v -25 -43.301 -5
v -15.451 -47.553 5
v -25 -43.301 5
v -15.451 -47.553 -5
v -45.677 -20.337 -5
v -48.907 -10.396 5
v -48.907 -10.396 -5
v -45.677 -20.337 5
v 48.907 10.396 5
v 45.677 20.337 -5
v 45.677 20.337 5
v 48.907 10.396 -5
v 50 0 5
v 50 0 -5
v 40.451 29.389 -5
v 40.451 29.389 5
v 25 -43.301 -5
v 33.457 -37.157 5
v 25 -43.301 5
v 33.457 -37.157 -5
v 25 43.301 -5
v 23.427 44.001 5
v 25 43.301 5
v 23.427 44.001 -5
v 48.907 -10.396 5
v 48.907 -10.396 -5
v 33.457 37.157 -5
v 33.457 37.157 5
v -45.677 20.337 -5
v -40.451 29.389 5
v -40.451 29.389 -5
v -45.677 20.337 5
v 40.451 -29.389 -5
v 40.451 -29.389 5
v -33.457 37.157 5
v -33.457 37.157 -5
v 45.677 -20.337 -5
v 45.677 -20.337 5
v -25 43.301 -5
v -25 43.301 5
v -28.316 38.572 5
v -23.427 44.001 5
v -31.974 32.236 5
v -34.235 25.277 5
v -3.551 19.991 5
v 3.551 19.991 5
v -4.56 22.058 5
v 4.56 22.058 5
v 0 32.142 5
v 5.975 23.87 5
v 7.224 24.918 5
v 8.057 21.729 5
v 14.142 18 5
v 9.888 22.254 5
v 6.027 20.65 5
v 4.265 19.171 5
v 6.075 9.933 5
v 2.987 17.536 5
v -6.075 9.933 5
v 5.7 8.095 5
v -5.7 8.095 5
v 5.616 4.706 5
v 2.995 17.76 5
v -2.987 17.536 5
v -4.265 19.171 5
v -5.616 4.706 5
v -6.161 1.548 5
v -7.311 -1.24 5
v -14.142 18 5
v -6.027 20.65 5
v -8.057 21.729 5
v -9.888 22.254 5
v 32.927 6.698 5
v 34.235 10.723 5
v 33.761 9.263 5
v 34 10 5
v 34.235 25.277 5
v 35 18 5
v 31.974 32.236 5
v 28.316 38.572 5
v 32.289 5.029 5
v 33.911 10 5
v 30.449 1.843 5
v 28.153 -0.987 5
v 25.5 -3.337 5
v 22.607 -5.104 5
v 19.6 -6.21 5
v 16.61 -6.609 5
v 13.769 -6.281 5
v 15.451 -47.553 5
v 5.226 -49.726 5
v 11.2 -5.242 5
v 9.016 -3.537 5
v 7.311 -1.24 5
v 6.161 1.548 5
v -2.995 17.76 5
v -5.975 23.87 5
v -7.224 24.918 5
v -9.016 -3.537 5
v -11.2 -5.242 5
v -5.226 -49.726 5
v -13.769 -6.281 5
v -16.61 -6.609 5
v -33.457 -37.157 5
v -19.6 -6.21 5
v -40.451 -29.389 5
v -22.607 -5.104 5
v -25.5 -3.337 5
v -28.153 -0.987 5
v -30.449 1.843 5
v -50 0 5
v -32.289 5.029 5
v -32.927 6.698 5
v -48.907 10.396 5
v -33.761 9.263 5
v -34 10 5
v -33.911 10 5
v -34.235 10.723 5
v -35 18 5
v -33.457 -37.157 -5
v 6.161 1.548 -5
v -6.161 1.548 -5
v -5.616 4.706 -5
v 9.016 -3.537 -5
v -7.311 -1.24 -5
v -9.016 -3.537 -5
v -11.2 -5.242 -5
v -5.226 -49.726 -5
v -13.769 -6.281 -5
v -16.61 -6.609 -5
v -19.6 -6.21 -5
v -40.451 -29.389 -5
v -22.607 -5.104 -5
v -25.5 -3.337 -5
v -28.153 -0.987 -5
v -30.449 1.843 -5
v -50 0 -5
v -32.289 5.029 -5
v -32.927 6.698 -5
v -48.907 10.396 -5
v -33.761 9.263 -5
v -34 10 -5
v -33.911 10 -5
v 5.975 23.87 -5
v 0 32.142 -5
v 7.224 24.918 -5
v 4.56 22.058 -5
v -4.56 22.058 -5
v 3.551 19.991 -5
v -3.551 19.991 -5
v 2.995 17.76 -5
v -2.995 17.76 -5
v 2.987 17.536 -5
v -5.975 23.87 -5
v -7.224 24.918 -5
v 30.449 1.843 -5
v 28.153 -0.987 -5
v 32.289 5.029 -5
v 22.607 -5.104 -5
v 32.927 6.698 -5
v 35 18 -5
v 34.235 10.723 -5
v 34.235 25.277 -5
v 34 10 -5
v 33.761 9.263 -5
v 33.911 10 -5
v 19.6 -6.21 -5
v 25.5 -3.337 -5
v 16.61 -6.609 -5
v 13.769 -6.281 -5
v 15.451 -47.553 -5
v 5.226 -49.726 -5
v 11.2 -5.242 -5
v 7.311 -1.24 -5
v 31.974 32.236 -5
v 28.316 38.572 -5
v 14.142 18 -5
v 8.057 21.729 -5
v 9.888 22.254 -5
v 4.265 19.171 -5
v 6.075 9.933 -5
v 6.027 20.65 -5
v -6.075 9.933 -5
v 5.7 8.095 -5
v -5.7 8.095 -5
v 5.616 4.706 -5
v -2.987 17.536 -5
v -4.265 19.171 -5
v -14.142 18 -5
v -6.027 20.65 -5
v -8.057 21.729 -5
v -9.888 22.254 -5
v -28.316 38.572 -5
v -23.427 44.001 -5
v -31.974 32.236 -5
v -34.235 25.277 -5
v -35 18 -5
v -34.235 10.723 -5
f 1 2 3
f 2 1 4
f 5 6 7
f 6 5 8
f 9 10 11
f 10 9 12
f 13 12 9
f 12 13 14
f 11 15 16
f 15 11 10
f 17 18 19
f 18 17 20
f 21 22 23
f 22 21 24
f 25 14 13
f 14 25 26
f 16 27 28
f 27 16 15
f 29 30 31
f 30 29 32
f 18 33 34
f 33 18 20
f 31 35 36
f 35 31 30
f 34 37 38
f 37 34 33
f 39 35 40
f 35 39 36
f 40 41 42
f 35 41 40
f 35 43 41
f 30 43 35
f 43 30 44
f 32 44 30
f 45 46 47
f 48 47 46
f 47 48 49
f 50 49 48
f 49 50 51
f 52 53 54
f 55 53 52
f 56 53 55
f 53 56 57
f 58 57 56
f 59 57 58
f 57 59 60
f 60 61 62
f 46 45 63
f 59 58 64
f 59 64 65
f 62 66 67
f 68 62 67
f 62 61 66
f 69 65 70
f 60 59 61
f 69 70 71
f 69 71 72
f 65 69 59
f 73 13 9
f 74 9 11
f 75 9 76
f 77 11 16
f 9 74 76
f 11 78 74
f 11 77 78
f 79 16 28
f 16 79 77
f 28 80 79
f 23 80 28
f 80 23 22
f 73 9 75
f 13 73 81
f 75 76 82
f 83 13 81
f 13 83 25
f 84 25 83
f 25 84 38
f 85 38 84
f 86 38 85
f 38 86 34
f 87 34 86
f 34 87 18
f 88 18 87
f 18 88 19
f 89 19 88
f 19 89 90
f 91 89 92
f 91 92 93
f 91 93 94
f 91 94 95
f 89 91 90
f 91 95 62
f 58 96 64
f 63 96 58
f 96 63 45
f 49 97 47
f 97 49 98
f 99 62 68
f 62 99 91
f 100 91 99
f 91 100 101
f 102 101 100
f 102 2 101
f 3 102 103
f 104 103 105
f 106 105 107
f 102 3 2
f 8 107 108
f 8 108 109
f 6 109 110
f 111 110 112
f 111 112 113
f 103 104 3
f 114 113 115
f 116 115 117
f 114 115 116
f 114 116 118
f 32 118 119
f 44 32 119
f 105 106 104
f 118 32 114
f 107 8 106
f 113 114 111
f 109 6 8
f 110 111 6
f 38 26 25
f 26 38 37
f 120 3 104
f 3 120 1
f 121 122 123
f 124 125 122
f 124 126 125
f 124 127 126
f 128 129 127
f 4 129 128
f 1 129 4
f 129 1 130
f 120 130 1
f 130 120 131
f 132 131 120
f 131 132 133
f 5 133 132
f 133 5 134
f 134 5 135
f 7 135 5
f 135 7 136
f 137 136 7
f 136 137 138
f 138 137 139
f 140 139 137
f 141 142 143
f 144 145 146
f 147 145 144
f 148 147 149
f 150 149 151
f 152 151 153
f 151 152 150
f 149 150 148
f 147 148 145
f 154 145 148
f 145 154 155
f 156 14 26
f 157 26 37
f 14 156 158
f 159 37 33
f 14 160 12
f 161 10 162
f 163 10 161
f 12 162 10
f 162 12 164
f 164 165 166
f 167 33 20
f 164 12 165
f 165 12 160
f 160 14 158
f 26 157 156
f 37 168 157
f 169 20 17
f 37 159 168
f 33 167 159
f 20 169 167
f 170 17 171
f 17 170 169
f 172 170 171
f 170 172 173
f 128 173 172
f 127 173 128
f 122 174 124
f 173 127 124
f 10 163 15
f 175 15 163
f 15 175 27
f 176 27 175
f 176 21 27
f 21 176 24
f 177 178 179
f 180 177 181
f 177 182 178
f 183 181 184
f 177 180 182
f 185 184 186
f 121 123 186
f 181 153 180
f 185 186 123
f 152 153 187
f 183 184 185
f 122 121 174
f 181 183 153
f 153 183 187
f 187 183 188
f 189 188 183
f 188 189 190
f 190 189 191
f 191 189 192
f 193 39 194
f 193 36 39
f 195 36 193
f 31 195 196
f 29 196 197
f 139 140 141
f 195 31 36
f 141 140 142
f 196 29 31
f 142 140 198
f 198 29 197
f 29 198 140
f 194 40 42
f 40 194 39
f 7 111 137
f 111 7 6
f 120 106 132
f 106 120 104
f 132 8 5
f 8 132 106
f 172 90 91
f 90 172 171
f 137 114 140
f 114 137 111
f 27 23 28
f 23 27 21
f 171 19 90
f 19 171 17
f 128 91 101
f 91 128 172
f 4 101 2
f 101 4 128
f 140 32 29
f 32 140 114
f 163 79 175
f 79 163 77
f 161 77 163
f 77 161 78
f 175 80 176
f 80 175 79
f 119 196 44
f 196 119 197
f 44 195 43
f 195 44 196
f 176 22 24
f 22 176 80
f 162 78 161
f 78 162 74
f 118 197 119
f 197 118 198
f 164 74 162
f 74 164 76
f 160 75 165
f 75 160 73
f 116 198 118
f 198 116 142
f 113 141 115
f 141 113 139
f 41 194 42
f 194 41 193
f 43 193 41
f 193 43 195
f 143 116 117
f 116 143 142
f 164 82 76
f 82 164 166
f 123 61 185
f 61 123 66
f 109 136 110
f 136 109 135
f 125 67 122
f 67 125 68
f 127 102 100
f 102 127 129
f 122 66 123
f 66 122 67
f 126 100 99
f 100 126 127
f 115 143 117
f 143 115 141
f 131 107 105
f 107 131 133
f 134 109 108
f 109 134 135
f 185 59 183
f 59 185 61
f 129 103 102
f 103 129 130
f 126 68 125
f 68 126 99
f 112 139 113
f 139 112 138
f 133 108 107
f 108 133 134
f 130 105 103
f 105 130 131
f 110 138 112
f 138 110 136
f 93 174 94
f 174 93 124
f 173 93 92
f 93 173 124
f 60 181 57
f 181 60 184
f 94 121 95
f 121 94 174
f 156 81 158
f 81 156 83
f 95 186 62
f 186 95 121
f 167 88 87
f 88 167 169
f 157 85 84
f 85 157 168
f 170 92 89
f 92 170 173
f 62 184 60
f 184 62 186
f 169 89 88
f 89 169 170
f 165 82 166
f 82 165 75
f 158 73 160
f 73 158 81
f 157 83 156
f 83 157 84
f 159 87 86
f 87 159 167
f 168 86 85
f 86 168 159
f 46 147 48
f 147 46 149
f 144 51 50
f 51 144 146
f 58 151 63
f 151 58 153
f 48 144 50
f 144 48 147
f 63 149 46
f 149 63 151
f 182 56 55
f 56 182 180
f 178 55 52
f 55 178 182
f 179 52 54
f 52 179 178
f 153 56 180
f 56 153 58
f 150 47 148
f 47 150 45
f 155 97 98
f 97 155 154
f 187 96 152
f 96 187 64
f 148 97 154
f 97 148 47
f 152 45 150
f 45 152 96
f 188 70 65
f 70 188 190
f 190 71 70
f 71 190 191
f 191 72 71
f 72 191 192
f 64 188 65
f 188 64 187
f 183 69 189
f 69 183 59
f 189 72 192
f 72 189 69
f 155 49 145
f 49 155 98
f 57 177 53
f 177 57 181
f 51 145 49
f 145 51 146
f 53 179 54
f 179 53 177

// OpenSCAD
/*

---------------------------------------------------------------------------------------------------
\\\\\\\\\\\\     Made in Anita  -  PilotoRebelde (Rogue squadron)    /////////////
---------------------------------------------------------------------------------------------------

*/




difference(){

	cylinder (h = 10, r=50, center = true);


	translate([0,18,0])

	cylinder (h = 15, r=35, center = true);

}


difference(){
	
	translate([0,-5,0])
	cube([70,30,10], center=true);

	#translate([-20,10,0])
	rotate([0,0,-60])
	color([0,0,1])
	scale([0.8,0.6,1])
	cylinder (h = 15, r=22, center = true);


	#rotate([0,180,0])
	translate([-20,10,0])
	rotate([0,0,-60])
	color([0,0,1])
	scale([0.8,0.6,1])
	cylinder (h = 15, r=22, center = true);

}

difference(){

	translate([0,18,0])
	rotate([0,0,45])
	cube([20,20,10], center=true);
	
	#rotate([0,0,-20])
	scale([0.5,0.5,0.5])
	difference(){

		translate([15,40,0])
		color([0,0,1])
	
		cylinder (h = 25, r=22, center = true);

		translate([15,30,0])
		color([0,0,1])
	
		cylinder (h = 35, r=22, center = true);
	}

	#
	rotate([0,180,0])
	rotate([0,0,-20])
	scale([0.5,0.5,0.5])
	difference(){

		translate([15,40,0])
		color([0,0,1])
	
		cylinder (h = 25, r=22, center = true);

		translate([15,30,0])
		color([0,0,1])
	
		cylinder (h = 35, r=22, center = true);

	}

}
